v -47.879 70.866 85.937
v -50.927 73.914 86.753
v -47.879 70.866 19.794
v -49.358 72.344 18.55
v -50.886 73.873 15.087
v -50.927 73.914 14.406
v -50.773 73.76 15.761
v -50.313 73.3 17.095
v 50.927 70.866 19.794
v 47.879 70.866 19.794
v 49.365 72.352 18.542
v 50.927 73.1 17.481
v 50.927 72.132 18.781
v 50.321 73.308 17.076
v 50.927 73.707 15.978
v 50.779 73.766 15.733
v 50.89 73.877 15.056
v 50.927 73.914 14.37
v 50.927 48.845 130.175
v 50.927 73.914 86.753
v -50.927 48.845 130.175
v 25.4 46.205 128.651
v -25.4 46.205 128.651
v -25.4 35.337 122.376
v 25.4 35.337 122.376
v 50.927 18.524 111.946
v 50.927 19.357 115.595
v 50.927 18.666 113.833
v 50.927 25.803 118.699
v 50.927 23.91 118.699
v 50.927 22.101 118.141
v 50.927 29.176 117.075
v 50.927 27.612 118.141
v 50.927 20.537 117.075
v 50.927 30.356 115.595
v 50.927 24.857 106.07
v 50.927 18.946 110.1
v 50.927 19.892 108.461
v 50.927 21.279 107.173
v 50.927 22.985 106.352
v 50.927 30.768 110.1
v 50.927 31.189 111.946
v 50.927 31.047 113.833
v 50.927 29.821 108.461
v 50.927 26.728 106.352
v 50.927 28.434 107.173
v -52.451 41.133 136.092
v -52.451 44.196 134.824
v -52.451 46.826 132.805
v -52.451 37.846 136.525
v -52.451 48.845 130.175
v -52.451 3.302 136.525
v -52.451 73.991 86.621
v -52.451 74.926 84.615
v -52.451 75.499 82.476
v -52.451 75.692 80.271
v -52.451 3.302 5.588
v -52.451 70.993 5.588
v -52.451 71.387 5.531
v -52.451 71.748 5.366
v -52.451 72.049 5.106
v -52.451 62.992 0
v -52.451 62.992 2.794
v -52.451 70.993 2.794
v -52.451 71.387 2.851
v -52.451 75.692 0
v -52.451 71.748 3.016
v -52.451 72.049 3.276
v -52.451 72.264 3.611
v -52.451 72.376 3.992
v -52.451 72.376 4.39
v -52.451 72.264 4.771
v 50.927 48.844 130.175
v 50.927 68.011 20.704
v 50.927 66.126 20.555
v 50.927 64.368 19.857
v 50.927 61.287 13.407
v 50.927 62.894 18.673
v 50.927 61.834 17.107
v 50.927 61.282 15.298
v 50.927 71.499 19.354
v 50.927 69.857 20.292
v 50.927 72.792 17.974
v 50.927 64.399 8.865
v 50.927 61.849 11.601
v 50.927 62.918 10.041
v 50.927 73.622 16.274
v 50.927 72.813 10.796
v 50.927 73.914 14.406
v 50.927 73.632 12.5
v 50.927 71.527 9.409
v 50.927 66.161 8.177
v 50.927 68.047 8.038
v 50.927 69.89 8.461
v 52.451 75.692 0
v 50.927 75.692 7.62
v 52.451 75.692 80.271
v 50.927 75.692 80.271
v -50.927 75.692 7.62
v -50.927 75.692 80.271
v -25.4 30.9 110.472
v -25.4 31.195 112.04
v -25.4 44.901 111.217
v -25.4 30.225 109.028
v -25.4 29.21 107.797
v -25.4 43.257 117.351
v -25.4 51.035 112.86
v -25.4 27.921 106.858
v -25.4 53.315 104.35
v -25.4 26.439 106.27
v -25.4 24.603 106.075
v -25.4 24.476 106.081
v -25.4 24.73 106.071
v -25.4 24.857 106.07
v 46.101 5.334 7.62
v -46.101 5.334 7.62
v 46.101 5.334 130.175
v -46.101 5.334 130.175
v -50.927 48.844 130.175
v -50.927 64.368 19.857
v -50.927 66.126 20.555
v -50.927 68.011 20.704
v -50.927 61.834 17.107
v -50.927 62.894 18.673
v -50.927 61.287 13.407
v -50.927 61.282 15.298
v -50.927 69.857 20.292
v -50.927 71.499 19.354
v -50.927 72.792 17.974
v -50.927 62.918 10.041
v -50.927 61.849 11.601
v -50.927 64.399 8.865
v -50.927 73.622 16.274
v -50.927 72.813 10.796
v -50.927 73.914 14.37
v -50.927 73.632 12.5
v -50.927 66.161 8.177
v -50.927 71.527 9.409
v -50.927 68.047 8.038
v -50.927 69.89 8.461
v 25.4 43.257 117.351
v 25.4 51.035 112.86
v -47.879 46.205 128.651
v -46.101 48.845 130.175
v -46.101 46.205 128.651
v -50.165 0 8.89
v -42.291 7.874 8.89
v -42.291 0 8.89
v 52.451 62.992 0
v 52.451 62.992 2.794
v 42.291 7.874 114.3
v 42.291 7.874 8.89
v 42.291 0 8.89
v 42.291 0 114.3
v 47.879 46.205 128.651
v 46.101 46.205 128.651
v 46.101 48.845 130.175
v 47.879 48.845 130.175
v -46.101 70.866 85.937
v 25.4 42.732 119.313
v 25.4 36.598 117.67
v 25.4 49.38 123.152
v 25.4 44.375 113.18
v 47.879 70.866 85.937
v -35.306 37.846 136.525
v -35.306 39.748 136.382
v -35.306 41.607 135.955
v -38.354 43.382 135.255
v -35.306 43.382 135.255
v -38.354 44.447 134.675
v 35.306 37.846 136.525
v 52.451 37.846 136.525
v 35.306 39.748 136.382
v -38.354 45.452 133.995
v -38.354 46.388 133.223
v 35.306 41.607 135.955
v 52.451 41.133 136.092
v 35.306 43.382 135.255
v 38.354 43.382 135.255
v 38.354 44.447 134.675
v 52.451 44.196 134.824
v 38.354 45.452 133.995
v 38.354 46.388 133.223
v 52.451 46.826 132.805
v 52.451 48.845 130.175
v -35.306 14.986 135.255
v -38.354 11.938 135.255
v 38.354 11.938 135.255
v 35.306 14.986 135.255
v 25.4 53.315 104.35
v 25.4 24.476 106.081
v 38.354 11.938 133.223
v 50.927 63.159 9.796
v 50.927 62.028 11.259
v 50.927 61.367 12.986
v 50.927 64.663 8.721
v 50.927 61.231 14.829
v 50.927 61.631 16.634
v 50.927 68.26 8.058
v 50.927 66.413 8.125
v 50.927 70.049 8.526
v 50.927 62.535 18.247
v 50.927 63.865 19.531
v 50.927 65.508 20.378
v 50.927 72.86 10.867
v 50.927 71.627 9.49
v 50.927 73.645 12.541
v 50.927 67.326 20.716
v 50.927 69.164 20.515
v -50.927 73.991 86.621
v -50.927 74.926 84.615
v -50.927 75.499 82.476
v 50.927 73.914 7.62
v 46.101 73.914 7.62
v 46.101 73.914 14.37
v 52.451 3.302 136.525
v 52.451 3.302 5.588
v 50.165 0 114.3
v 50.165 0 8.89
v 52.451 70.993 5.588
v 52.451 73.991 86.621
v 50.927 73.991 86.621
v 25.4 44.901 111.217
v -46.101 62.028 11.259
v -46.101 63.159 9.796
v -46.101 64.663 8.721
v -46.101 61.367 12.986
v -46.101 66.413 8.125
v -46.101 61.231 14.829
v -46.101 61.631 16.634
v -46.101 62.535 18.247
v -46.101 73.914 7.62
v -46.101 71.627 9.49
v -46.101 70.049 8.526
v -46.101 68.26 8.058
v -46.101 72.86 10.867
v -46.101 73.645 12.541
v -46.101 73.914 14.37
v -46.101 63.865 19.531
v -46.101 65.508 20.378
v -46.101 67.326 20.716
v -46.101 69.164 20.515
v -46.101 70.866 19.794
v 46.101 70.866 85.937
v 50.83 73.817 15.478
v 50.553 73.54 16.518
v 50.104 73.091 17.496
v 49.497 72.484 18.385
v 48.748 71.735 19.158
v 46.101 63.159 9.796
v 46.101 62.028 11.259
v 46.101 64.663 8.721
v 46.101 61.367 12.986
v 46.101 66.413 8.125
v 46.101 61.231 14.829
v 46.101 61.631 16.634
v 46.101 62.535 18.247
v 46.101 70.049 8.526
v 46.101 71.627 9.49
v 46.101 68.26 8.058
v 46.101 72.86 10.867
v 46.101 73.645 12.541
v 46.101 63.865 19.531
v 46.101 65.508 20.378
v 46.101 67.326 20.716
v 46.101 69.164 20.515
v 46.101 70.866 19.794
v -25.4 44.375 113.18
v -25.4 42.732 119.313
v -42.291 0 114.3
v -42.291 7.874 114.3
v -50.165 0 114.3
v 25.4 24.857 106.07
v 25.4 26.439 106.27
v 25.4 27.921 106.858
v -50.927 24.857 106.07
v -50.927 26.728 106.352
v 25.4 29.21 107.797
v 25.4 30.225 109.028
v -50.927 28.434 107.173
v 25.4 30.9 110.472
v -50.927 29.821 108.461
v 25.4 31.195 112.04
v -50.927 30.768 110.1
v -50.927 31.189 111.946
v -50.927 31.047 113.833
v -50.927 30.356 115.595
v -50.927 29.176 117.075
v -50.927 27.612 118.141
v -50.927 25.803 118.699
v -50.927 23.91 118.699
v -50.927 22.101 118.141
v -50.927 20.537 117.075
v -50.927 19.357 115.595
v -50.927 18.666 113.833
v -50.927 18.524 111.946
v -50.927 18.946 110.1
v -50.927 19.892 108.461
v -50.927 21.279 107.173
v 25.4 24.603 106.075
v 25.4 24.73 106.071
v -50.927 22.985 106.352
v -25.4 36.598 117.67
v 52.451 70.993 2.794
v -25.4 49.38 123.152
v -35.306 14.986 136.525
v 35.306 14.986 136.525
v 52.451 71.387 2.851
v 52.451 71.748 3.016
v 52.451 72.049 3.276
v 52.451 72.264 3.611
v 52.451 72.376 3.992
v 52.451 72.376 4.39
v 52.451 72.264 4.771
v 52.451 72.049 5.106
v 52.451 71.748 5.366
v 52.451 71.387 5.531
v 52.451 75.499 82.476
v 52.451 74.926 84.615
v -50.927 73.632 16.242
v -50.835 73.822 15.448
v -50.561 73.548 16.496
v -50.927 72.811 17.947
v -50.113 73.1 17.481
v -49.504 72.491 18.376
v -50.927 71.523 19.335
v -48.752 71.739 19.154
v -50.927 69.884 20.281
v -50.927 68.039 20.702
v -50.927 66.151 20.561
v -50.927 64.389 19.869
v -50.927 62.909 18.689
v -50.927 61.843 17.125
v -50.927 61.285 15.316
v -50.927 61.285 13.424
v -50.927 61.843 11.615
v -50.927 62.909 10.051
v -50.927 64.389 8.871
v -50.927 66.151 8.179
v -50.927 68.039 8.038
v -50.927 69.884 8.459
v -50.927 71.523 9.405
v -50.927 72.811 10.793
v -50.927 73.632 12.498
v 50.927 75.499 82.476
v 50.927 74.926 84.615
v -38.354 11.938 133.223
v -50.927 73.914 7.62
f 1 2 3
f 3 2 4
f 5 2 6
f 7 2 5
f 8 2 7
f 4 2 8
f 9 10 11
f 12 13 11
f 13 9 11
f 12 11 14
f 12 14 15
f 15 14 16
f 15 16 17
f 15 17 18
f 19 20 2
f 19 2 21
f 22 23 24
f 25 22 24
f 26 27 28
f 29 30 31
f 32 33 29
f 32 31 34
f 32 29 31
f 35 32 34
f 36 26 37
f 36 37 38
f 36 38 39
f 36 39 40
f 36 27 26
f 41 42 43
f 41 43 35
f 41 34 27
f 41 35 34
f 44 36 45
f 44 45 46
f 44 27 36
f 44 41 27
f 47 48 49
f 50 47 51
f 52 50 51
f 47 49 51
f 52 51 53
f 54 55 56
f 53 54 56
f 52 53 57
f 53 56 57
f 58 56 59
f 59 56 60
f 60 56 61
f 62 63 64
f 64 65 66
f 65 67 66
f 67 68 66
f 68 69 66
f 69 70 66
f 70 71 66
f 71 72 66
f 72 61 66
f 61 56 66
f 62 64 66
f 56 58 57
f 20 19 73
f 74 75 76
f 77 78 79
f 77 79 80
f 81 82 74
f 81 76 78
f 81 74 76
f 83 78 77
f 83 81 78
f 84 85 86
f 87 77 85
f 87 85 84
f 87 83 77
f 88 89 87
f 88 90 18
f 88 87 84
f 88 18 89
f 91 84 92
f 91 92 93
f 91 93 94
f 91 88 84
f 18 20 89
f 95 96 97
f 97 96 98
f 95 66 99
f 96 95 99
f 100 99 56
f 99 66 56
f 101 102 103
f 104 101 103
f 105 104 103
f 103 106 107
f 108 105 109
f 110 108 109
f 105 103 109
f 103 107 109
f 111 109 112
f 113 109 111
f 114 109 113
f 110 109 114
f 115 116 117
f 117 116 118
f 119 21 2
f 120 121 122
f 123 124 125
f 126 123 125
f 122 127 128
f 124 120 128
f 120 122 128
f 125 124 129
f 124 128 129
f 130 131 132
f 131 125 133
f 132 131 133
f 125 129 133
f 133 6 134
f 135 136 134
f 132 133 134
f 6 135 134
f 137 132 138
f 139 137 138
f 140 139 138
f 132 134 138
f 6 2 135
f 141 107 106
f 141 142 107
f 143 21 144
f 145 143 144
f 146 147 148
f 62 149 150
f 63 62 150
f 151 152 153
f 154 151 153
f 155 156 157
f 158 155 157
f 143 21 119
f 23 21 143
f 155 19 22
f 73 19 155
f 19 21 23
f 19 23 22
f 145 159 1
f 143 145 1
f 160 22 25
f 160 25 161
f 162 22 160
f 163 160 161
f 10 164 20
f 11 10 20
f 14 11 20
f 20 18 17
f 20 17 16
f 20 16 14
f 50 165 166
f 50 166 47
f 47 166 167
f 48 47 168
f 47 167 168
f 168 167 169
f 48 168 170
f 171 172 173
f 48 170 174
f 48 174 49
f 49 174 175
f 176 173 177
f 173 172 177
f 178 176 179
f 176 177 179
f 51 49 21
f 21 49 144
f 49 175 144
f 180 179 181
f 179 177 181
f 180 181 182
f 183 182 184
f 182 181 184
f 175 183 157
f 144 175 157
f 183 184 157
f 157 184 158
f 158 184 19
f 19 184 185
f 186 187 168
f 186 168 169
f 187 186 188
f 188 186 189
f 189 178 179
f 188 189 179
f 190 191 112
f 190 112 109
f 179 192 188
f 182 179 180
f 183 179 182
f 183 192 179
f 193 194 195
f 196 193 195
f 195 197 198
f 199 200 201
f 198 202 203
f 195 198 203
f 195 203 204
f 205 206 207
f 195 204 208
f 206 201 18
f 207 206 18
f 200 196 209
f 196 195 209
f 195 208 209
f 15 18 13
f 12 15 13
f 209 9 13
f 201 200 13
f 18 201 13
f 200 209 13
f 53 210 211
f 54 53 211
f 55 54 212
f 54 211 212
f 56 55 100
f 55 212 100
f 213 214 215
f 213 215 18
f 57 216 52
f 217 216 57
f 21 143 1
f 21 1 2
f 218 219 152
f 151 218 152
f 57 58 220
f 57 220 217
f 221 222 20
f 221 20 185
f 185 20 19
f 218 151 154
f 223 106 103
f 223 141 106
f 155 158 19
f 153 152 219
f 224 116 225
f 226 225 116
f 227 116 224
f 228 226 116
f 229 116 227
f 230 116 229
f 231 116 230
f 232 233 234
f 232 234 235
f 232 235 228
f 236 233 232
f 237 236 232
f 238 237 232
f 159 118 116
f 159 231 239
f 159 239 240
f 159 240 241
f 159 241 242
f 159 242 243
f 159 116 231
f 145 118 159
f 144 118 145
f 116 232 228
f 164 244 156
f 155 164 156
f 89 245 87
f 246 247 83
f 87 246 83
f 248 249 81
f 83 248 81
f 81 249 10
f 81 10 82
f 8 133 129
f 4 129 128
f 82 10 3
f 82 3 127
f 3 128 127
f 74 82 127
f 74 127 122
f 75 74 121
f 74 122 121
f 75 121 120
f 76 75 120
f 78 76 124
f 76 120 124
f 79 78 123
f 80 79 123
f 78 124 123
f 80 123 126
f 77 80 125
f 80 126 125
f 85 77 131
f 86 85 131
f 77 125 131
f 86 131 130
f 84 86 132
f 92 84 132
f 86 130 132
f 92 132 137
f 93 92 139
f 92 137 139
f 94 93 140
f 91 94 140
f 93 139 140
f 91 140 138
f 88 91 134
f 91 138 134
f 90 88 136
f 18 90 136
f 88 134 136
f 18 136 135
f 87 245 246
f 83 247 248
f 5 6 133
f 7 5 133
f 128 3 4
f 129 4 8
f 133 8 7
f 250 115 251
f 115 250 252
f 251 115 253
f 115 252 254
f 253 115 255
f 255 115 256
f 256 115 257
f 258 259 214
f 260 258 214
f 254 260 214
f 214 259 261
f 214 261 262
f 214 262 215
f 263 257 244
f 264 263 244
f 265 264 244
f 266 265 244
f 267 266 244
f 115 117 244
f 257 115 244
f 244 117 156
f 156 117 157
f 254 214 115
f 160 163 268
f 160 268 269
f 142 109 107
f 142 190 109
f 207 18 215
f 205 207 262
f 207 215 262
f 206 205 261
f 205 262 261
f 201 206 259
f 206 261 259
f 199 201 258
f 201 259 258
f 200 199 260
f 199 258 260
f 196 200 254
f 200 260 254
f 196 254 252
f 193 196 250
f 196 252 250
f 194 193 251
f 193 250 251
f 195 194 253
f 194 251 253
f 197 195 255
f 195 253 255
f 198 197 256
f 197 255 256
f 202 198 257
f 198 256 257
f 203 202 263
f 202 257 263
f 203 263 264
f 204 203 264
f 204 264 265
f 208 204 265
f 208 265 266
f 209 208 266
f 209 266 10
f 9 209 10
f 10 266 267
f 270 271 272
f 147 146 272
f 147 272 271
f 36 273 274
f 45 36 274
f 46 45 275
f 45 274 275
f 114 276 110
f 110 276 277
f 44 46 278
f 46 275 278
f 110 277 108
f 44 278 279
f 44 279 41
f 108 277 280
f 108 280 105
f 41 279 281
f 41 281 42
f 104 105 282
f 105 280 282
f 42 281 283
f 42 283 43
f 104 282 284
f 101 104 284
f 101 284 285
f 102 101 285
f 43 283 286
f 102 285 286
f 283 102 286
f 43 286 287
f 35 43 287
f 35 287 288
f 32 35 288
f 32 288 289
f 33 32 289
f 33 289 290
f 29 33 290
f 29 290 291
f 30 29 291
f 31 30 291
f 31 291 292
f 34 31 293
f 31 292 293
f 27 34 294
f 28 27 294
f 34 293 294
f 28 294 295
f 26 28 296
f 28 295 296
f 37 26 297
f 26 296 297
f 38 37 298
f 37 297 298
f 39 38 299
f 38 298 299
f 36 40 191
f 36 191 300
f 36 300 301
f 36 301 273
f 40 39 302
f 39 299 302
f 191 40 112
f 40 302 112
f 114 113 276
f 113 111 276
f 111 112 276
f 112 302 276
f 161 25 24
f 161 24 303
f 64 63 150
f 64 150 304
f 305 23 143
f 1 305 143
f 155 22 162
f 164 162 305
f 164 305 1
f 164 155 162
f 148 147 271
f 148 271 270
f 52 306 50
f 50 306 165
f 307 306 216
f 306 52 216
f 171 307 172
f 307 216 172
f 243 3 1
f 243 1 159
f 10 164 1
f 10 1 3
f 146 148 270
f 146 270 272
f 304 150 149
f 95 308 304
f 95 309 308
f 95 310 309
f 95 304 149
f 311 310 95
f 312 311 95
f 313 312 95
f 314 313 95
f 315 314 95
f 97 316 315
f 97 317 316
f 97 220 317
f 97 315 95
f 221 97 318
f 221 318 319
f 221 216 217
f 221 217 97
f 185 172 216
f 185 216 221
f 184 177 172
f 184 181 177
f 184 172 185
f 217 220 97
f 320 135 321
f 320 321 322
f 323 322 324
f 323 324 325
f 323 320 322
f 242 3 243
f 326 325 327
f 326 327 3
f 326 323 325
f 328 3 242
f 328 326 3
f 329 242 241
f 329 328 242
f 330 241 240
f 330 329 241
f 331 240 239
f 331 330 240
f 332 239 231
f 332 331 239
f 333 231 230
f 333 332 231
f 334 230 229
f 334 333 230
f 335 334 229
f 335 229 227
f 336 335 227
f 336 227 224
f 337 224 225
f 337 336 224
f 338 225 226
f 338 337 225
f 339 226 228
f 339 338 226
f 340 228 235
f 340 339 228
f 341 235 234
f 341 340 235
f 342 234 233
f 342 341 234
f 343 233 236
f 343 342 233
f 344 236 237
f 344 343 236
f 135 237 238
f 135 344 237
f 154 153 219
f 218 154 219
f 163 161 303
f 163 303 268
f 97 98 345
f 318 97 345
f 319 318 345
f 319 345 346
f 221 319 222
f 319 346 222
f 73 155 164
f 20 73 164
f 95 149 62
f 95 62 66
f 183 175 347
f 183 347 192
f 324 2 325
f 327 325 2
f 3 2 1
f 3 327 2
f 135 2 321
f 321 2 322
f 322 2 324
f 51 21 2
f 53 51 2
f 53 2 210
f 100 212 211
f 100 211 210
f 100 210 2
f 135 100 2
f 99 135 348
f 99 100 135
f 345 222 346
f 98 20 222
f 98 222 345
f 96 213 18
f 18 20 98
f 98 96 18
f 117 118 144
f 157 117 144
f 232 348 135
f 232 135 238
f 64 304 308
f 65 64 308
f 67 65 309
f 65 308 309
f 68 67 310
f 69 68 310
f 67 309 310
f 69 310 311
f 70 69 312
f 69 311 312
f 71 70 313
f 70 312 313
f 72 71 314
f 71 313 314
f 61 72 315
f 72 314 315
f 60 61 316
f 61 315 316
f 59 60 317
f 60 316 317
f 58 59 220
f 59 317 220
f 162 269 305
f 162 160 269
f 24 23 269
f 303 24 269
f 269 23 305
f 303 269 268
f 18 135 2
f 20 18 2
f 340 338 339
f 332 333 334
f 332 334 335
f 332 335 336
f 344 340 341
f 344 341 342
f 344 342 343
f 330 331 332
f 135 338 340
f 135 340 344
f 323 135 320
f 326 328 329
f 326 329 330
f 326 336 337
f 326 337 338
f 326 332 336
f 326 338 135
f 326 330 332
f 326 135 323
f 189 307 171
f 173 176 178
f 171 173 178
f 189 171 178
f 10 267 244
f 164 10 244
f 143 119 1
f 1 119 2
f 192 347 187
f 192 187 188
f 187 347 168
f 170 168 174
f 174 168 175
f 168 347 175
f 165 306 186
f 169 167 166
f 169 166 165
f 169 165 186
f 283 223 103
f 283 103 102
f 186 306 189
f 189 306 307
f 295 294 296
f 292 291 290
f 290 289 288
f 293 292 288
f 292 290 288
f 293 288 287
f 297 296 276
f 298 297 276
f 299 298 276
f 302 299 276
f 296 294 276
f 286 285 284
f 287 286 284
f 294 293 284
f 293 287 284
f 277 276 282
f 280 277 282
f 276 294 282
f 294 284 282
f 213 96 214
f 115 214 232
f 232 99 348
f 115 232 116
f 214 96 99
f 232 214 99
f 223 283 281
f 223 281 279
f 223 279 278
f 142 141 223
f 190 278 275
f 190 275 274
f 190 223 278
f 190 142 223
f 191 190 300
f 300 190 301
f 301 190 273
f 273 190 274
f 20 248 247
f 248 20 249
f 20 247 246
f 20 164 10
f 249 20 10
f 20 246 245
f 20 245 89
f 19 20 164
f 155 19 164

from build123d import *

# Parameters (mm, degrees)
SKETCH1_W                       = 136.525
SKETCH1_H                       = 75.692
BOSS_EXTRUDE1_DEPTH             = 52.451
CUT_EXTRUDE1_DEPTH              = 189.076537859
SKETCH3_W                       = 136.525
SKETCH3_H                       = 3.302
CUT_EXTRUDE2_DEPTH              = 189.076537859
BOSS_EXTRUDE2_START             = 8.89
BOSS_EXTRUDE2_DEPTH             = 105.41
BOSS_EXTRUDE2_2_DEPTH           = 105.41
SKETCH5_W                       = 101.854
SKETCH5_H                       = 128.905
CUT_EXTRUDE3_DEPTH              = 1.778
SKETCH6_W                       = 70.612
SKETCH6_H                       = 58.928
CUT_EXTRUDE4_DEPTH              = 3.302
SKETCH7_W                       = 76.708
SKETCH7_H                       = 61.976
CUT_EXTRUDE5_DEPTH              = 2.032
CUT_EXTRUDE6_DEPTH              = 189.076537859
SPLIT1_SURFACE_1_BACK           = 189.077
SPLIT1_SURFACE_1_DEPTH          = 378.154
SPLIT1_SURFACE_2_BACK           = 189.077
SPLIT1_SURFACE_2_DEPTH          = 378.154
BOSS_EXTRUDE3_REACH             = 166.68
SKETCH12_R                      = 6.35
BOSS_EXTRUDE3_DIRECTION_2_REACH = 166.68
BOSS_EXTRUDE4_DEPTH             = 101.854
CHAMFER1_SIZE                   = 3.048
INTERSECT1_START                = -88.312595624
INTERSECT1_DEPTH                = 106.603527134
INTERSECT1_START_2              = 14.369999962
INTERSECT1_2_DEPTH              = 114.281000039
INTERSECT1_START_3              = -50.927
INTERSECT1_3_OUTLINE_R          = 6.35
INTERSECT1_3_DEPTH              = 101.854
SPLIT4_START                    = -46.101
SPLIT4_DEPTH                    = 98.552
SPLIT4_START_2                  = 46.101
SPLIT4_2_DEPTH                  = 6.35
SPLIT4_START_3                  = 47.879
SPLIT4_3_DEPTH                  = 4.572
SPLIT4_START_4                  = 50.927
SPLIT4_4_OUTLINE_R              = 6.35
SPLIT4_4_DEPTH                  = 1.524
SPLIT4_START_5                  = -88.312595624
SPLIT4_5_DEPTH                  = 106.603527134
SPLIT4_START_6                  = 14.369999962
SPLIT4_6_DEPTH                  = 115.805000039
SPLIT4_START_7                  = 7
SPLIT4_7_OUTLINE_W              = 3.048
SPLIT4_7_OUTLINE_H              = 1.778
SPLIT4_7_DEPTH                  = 8.001344832
BOSS_EXTRUDE5_DEPTH             = 25.4
BOSS_EXTRUDE6_DEPTH             = 25.4
BOSS_EXTRUDE7_START             = -50.927
BOSS_EXTRUDE7_OUTLINE_R         = 6.35
BOSS_EXTRUDE7_DEPTH             = 101.854


with BuildPart() as part:
    # Sketch1 → Boss-Extrude1 (new, symmetric)
    with BuildSketch(Plane(origin=(0, 0, 0), x_dir=(0, 0, -1), z_dir=(1, 0, 0))):
        with Locations((-68.2625, 37.846)):
            Rectangle(SKETCH1_W, SKETCH1_H)
    extrude(amount=BOSS_EXTRUDE1_DEPTH, both=True)

    # Sketch2 → Cut-Extrude1 (cut, through all)
    with BuildSketch(Plane(origin=(52.451, 0, 0), x_dir=(0, 0, -1), z_dir=(1, 0, 0))):
        with BuildLine():
            Line((0, 0), (0, 62.992))
            Line((0, 62.992), (-2.794, 62.992))
            Line((-2.794, 62.992), (-2.794, 70.993))
            ThreePointArc((-2.794, 70.993), (-4.191, 72.39), (-5.588, 70.993))
            Line((-5.588, 70.993), (-5.588, 0))
            Line((-5.588, 0), (0, 0))
        make_face()
    extrude(amount=-CUT_EXTRUDE1_DEPTH, mode=Mode.SUBTRACT)

    # Sketch3 → Cut-Extrude2 (cut, through all)
    with BuildSketch(Plane(origin=(52.451, 0, 0), x_dir=(0, 0, -1), z_dir=(1, 0, 0))):
        with Locations((-68.2625, 1.651)):
            Rectangle(SKETCH3_W, SKETCH3_H)
    extrude(amount=-CUT_EXTRUDE2_DEPTH, mode=Mode.SUBTRACT)

    # Sketch5 → Cut-Extrude3 (cut)
    with BuildSketch(Plane(origin=(0, 75.692, 0), x_dir=(1, 0, 0), z_dir=(0, 1, 0))):
        with Locations((0, -72.0725)):
            Rectangle(SKETCH5_W, SKETCH5_H)
    extrude(amount=-CUT_EXTRUDE3_DEPTH, mode=Mode.SUBTRACT)

    # Sketch6 → Cut-Extrude4 (cut)
    with BuildSketch(Plane.XY.offset(136.525)):
        with Locations((0, 44.45)):
            Rectangle(SKETCH6_W, SKETCH6_H)
    extrude(amount=-CUT_EXTRUDE4_DEPTH, mode=Mode.SUBTRACT)

    # Sketch7 → Cut-Extrude5 (cut)
    with BuildSketch(Plane.XY.offset(133.223)):
        with Locations((0, 42.926)):
            Rectangle(SKETCH7_W, SKETCH7_H)
    extrude(amount=CUT_EXTRUDE5_DEPTH, mode=Mode.SUBTRACT)

    # Sketch8 → Cut-Extrude6 (cut, through all)
    with BuildSketch(Plane(origin=(52.451, 0, 0), x_dir=(0, 0, -1), z_dir=(1, 0, 0))):
        with BuildLine():
            Line((-136.525, 75.692), (-136.525, 37.846))
            ThreePointArc((-136.525, 37.846), (-134.823522628, 44.196), (-130.175, 48.844522628))
            Line((-130.175, 48.844522628), (-86.620850393, 73.990522628))
            ThreePointArc((-86.620850393, 73.990522628), (-83.557852266, 75.259257994), (-80.270850393, 75.692))
            Line((-80.270850393, 75.692), (-136.525, 75.692))
        make_face()
    extrude(amount=-CUT_EXTRUDE6_DEPTH, mode=Mode.SUBTRACT)


with BuildPart() as body_2:
    # Sketch4 → Boss-Extrude2 (new body)
    with BuildSketch(Plane.XY.offset(BOSS_EXTRUDE2_START)):
        Polygon((42.291, 7.874), (42.291, 0), (50.165, 0), align=None)
    extrude(amount=BOSS_EXTRUDE2_DEPTH)


with BuildPart() as body_3:
    # Sketch4 → Boss-Extrude2 2 (new body)
    with BuildSketch(Plane.XY.offset(BOSS_EXTRUDE2_START)):
        Polygon((-42.291, 7.874), (-42.291, 0), (-50.165, 0), align=None)
    extrude(amount=BOSS_EXTRUDE2_2_DEPTH)


with BuildPart() as body_4:
    # Split1: the piece behind the surface
    add(part.part)
    # Split1 surface: a surface, the sketch's curves swept straight by 378.154 mm
    with BuildLine(Plane(origin=(52.451, 0, 0), x_dir=(0, 0, -1), z_dir=(1, 0, 0)).offset(-SPLIT1_SURFACE_1_BACK), mode=Mode.PRIVATE) as split1_surface_1_path:
        Line((-130.175, 75.692), (-7.62, 75.692))
        Line((-7.62, 75.692), (-7.62, 5.334))
        Line((-7.62, 5.334), (-130.175, 5.334))
        Line((-130.175, 5.334), (-130.175, 75.692))
    split1_surface_1 = Shell.extrude(split1_surface_1_path.wire(), (1 * SPLIT1_SURFACE_1_DEPTH, 0 * SPLIT1_SURFACE_1_DEPTH, 0 * SPLIT1_SURFACE_1_DEPTH))
    split(bisect_by=split1_surface_1, keep=Keep.BOTTOM)


with BuildPart() as part_1:
    add(part.part)

    # Split1: split by a surface, the side it looks to stays
    # Split1 surface: a surface, the sketch's curves swept straight by 378.154 mm
    with BuildLine(Plane(origin=(52.451, 0, 0), x_dir=(0, 0, -1), z_dir=(1, 0, 0)).offset(-SPLIT1_SURFACE_2_BACK), mode=Mode.PRIVATE) as split1_surface_2_path:
        Line((-130.175, 75.692), (-7.62, 75.692))
        Line((-7.62, 75.692), (-7.62, 5.334))
        Line((-7.62, 5.334), (-130.175, 5.334))
        Line((-130.175, 5.334), (-130.175, 75.692))
    split1_surface_2 = Shell.extrude(split1_surface_2_path.wire(), (1 * SPLIT1_SURFACE_2_DEPTH, 0 * SPLIT1_SURFACE_2_DEPTH, 0 * SPLIT1_SURFACE_2_DEPTH))
    split(bisect_by=split1_surface_2, keep=Keep.TOP)


with BuildPart() as body_5:

    # Boss-Extrude3: up to this face of the body (flat: up to its plane)
    boss_extrude3_end = Plane(body_4.part.faces().sort_by_distance((50.927, 74.793132551, 46.152790149))[0])
    # Sketch12 → Boss-Extrude3 (new, up to the picked face)
    with BuildSketch(Plane(origin=(0, 0, 0), x_dir=(0, 0, -1), z_dir=(1, 0, 0)), mode=Mode.PRIVATE) as boss_extrude3_sk1:
        with Locations(Location((-14.369999962, 67.564, 0), (0, 0, 180))):
            Circle(SKETCH12_R)
    boss_extrude3_tool1 = split(extrude(boss_extrude3_sk1.sketch, amount=BOSS_EXTRUDE3_REACH, mode=Mode.PRIVATE), bisect_by=boss_extrude3_end, keep=Keep.BOTH, mode=Mode.PRIVATE)
    add(boss_extrude3_tool1.solids().sort_by(Axis((0, 67.564, 14.37), (1, 0, 0)))[0])


    # Boss-Extrude3 direction 2: up to this face of the body (flat: up to its plane)
    boss_extrude3_direction_2_end = Plane(body_4.part.faces().sort_by_distance((-50.927, 74.793132551, 46.152790149))[0])
    # Sketch12 → Boss-Extrude3 direction 2 (add, up to the picked face)
    with BuildSketch(Plane(origin=(0, 0, 0), x_dir=(0, 0, -1), z_dir=(1, 0, 0)), mode=Mode.PRIVATE) as boss_extrude3_direction_2_sk1:
        with Locations(Location((-14.369999962, 67.564, 0), (0, 0, 180))):
            Circle(SKETCH12_R)
    boss_extrude3_direction_2_tool1 = split(extrude(boss_extrude3_direction_2_sk1.sketch, amount=-BOSS_EXTRUDE3_DIRECTION_2_REACH, mode=Mode.PRIVATE), bisect_by=boss_extrude3_direction_2_end, keep=Keep.BOTH, mode=Mode.PRIVATE)
    add(boss_extrude3_direction_2_tool1.solids().sort_by(Axis((0, 67.564, 14.37), (-1, 0, 0)))[0])

    # Sketch13 → Boss-Extrude4 (add)
    with BuildSketch(Plane(origin=(50.927, 0, 0), x_dir=(0, 0, -1), z_dir=(1, 0, 0))):
        Polygon((-14.369999962, 73.914), (-86.753391473, 73.914), (-130.175, 48.844522628), (-128.651, 46.204877197), (-85.936682334, 70.866), (-14.369999962, 70.866), align=None)
    extrude(amount=-BOSS_EXTRUDE4_DEPTH)

    # Chamfer1
    chamfer1_edges = [body_5.edges().sort_by_distance(p)[0] for p in [
        (-50.927, 58.535438599, 107.293841167),
        (-50.927, 70.866, 52.865319024),
        (50.927, 58.535438599, 107.293841167),
        (50.927, 70.866, 52.865319024),
    ]]
    chamfer(chamfer1_edges, length=CHAMFER1_SIZE - 0.0001)  # a hair under: the kernel refuses the full size

    # Sketch15 → Boss-Extrude5 (add, symmetric)
    with BuildSketch(Plane(origin=(0, 0, 0), x_dir=(0, 0, -1), z_dir=(1, 0, 0))):
        Polygon((-128.651, 46.204877197), (-122.37630963, 35.336794674), (-117.669810566, 36.597897298), (-113.179682506, 44.375027231), (-119.313311503, 42.731526294), (-123.151738686, 49.379877197), align=None)
    extrude(amount=BOSS_EXTRUDE5_DEPTH, both=True)


with BuildPart() as body_4_1:
    add(body_4.part)

    # Intersect1: read off the stored shape, not the designer's step
    # Intersect1 outline → Intersect1 (cut)
    with BuildSketch(Plane(origin=(0, 0, 0), x_dir=(1, 0, 0), z_dir=(0, 0.49999999999998085, -0.8660254037844498)).offset(INTERSECT1_START)):
        Polygon((-47.879, -104.340097432), (-50.927, -107.388097432), (50.927, -107.388097432), (47.879, -104.340097432), align=None)
    extrude(amount=INTERSECT1_DEPTH, mode=Mode.SUBTRACT)

    # Intersect1 2 outline → Intersect1 2 (cut)
    with BuildSketch(Plane.XY.offset(INTERSECT1_START_2)):
        Polygon((47.879, 70.866), (50.927, 73.914), (-50.927, 73.914), (-47.879, 70.866), align=None)
    extrude(amount=INTERSECT1_2_DEPTH, mode=Mode.SUBTRACT)

    # Intersect1 3 outline → Intersect1 3 (cut)
    with BuildSketch(Plane.YZ.offset(INTERSECT1_START_3)):
        with Locations((67.564, 14.369999962)):
            Circle(INTERSECT1_3_OUTLINE_R)
    extrude(amount=INTERSECT1_3_DEPTH, mode=Mode.SUBTRACT)

    # Split4: read off the stored shape, not the designer's step
    # Split4 outline → Split4 (cut)
    with BuildSketch(Plane.YZ.offset(SPLIT4_START)):
        with BuildLine():
            Line((5.334, 7.62), (75.692, 7.62))
            Line((75.692, 7.62), (75.692, 80.270850393))
            ThreePointArc((75.692, 80.270850393), (75.259257994, 83.557852266), (73.990522628, 86.620850393))
            Line((73.990522628, 86.620850393), (48.844522628, 130.175))
            Line((48.844522628, 130.175), (5.334, 130.175))
            Line((5.334, 130.175), (5.334, 7.62))
        make_face()
    extrude(amount=SPLIT4_DEPTH, mode=Mode.SUBTRACT)


with BuildPart() as body_6:
    # Split4 2 outline → Split4 2 (new body)
    with BuildSketch(Plane.YZ.offset(SPLIT4_START_2)):
        with BuildLine():
            Line((73.914, 7.62), (73.914, 14.369999962))
            ThreePointArc((73.914, 14.369999962), (62.028198342, 11.259147989), (70.866, 19.793955714))
            Line((70.866, 19.793955714), (70.866, 85.936682334))
            Line((70.866, 85.936682334), (46.204877197, 128.651))
            Line((46.204877197, 128.651), (48.844522628, 130.175))
            Line((48.844522628, 130.175), (5.334, 130.175))
            Line((5.334, 130.175), (5.334, 7.62))
            Line((5.334, 7.62), (73.914, 7.62))
        make_face()
    extrude(amount=SPLIT4_2_DEPTH)

    # Split4 3 outline → Split4 3 (add)
    with BuildSketch(Plane.YZ.offset(SPLIT4_START_3)):
        with BuildLine():
            ThreePointArc((70.866, 19.793955714), (73.099801658, 17.480851935), (73.914, 14.369999962))
            Line((73.914, 14.369999962), (73.914, 7.62))
            Line((73.914, 7.62), (75.692, 7.62))
            Line((75.692, 7.62), (75.692, 80.270850393))
            ThreePointArc((75.692, 80.270850393), (75.259257994, 83.557852266), (73.990522628, 86.620850393))
            Line((73.990522628, 86.620850393), (48.844522628, 130.175))
            Line((48.844522628, 130.175), (46.204877197, 128.651))
            Line((46.204877197, 128.651), (70.866, 85.936682334))
            Line((70.866, 85.936682334), (70.866, 19.793955714))
        make_face()
    extrude(amount=SPLIT4_3_DEPTH)

    # Split4 4 outline → Split4 4 (add)
    with BuildSketch(Plane.YZ.offset(SPLIT4_START_4)):
        with Locations((67.564, 14.369999962)):
            Circle(SPLIT4_4_OUTLINE_R)
    extrude(amount=SPLIT4_4_DEPTH)

    # Split4 5 outline → Split4 5 (cut)
    with BuildSketch(Plane(origin=(0, 0, 0), x_dir=(1, 0, 0), z_dir=(0, 0.49999999999998085, -0.8660254037844498)).offset(SPLIT4_START_5)):
        Polygon((50.927, -107.388097432), (47.879, -104.340097432), (47.879, -107.388097432), align=None)
    extrude(amount=SPLIT4_5_DEPTH, mode=Mode.SUBTRACT)

    # Split4 6 outline → Split4 6 (cut)
    with BuildSketch(Plane.XY.offset(SPLIT4_START_6)):
        Polygon((47.879, 75.692), (47.879, 70.866), (50.927, 73.914), (50.927, 75.692), align=None)
    extrude(amount=SPLIT4_6_DEPTH, mode=Mode.SUBTRACT)

    # Split4 7 outline → Split4 7 (cut)
    with BuildSketch(Plane.XY.offset(SPLIT4_START_7)):
        with Locations((49.403, 74.803)):
            Rectangle(SPLIT4_7_OUTLINE_W, SPLIT4_7_OUTLINE_H)
    extrude(amount=SPLIT4_7_DEPTH, mode=Mode.SUBTRACT)


with BuildPart() as part_2:
    add(part_1.part)

    # Combine1: read off the stored shape, not the designer's step
    # Combine1: union body 4, body 6
    add(body_4_1.part)
    add(body_6.part)


with BuildPart() as body_5_2:
    # Sketch16 → Boss-Extrude6 (new, symmetric)
    with BuildSketch(Plane(origin=(0, 0, 0), x_dir=(0, 0, -1), z_dir=(1, 0, 0))):
        with BuildLine():
            Line((-117.350550224, 43.257446594), (-111.216921227, 44.900947531))
            Line((-111.216921227, 44.900947531), (-112.039585508, 31.195151619))
            ThreePointArc((-112.039585508, 31.195151619), (-117.171136006, 20.6435254), (-106.081455399, 24.476097697))
            Line((-106.081455399, 24.476097697), (-104.350466513, 53.314812271))
            Line((-104.350466513, 53.314812271), (-112.860422163, 51.034576527))
            Line((-112.860422163, 51.034576527), (-117.350550224, 43.257446594))
        make_face()
    extrude(amount=BOSS_EXTRUDE6_DEPTH, both=True)

    # Boss-Extrude7: read off the stored shape, not the designer's step
    # Boss-Extrude7 outline → Boss-Extrude7 (add)
    with BuildSketch(Plane(origin=(0, 0, 0), x_dir=(0, 0, -1), z_dir=(1, 0, 0)).offset(BOSS_EXTRUDE7_START)):
        with Locations((-112.420047414, 24.856559603)):
            Circle(BOSS_EXTRUDE7_OUTLINE_R)
    extrude(amount=BOSS_EXTRUDE7_DEPTH)


solid = Compound([body_2.part, body_3.part, body_5.part, part_2.part, body_5_2.part])
